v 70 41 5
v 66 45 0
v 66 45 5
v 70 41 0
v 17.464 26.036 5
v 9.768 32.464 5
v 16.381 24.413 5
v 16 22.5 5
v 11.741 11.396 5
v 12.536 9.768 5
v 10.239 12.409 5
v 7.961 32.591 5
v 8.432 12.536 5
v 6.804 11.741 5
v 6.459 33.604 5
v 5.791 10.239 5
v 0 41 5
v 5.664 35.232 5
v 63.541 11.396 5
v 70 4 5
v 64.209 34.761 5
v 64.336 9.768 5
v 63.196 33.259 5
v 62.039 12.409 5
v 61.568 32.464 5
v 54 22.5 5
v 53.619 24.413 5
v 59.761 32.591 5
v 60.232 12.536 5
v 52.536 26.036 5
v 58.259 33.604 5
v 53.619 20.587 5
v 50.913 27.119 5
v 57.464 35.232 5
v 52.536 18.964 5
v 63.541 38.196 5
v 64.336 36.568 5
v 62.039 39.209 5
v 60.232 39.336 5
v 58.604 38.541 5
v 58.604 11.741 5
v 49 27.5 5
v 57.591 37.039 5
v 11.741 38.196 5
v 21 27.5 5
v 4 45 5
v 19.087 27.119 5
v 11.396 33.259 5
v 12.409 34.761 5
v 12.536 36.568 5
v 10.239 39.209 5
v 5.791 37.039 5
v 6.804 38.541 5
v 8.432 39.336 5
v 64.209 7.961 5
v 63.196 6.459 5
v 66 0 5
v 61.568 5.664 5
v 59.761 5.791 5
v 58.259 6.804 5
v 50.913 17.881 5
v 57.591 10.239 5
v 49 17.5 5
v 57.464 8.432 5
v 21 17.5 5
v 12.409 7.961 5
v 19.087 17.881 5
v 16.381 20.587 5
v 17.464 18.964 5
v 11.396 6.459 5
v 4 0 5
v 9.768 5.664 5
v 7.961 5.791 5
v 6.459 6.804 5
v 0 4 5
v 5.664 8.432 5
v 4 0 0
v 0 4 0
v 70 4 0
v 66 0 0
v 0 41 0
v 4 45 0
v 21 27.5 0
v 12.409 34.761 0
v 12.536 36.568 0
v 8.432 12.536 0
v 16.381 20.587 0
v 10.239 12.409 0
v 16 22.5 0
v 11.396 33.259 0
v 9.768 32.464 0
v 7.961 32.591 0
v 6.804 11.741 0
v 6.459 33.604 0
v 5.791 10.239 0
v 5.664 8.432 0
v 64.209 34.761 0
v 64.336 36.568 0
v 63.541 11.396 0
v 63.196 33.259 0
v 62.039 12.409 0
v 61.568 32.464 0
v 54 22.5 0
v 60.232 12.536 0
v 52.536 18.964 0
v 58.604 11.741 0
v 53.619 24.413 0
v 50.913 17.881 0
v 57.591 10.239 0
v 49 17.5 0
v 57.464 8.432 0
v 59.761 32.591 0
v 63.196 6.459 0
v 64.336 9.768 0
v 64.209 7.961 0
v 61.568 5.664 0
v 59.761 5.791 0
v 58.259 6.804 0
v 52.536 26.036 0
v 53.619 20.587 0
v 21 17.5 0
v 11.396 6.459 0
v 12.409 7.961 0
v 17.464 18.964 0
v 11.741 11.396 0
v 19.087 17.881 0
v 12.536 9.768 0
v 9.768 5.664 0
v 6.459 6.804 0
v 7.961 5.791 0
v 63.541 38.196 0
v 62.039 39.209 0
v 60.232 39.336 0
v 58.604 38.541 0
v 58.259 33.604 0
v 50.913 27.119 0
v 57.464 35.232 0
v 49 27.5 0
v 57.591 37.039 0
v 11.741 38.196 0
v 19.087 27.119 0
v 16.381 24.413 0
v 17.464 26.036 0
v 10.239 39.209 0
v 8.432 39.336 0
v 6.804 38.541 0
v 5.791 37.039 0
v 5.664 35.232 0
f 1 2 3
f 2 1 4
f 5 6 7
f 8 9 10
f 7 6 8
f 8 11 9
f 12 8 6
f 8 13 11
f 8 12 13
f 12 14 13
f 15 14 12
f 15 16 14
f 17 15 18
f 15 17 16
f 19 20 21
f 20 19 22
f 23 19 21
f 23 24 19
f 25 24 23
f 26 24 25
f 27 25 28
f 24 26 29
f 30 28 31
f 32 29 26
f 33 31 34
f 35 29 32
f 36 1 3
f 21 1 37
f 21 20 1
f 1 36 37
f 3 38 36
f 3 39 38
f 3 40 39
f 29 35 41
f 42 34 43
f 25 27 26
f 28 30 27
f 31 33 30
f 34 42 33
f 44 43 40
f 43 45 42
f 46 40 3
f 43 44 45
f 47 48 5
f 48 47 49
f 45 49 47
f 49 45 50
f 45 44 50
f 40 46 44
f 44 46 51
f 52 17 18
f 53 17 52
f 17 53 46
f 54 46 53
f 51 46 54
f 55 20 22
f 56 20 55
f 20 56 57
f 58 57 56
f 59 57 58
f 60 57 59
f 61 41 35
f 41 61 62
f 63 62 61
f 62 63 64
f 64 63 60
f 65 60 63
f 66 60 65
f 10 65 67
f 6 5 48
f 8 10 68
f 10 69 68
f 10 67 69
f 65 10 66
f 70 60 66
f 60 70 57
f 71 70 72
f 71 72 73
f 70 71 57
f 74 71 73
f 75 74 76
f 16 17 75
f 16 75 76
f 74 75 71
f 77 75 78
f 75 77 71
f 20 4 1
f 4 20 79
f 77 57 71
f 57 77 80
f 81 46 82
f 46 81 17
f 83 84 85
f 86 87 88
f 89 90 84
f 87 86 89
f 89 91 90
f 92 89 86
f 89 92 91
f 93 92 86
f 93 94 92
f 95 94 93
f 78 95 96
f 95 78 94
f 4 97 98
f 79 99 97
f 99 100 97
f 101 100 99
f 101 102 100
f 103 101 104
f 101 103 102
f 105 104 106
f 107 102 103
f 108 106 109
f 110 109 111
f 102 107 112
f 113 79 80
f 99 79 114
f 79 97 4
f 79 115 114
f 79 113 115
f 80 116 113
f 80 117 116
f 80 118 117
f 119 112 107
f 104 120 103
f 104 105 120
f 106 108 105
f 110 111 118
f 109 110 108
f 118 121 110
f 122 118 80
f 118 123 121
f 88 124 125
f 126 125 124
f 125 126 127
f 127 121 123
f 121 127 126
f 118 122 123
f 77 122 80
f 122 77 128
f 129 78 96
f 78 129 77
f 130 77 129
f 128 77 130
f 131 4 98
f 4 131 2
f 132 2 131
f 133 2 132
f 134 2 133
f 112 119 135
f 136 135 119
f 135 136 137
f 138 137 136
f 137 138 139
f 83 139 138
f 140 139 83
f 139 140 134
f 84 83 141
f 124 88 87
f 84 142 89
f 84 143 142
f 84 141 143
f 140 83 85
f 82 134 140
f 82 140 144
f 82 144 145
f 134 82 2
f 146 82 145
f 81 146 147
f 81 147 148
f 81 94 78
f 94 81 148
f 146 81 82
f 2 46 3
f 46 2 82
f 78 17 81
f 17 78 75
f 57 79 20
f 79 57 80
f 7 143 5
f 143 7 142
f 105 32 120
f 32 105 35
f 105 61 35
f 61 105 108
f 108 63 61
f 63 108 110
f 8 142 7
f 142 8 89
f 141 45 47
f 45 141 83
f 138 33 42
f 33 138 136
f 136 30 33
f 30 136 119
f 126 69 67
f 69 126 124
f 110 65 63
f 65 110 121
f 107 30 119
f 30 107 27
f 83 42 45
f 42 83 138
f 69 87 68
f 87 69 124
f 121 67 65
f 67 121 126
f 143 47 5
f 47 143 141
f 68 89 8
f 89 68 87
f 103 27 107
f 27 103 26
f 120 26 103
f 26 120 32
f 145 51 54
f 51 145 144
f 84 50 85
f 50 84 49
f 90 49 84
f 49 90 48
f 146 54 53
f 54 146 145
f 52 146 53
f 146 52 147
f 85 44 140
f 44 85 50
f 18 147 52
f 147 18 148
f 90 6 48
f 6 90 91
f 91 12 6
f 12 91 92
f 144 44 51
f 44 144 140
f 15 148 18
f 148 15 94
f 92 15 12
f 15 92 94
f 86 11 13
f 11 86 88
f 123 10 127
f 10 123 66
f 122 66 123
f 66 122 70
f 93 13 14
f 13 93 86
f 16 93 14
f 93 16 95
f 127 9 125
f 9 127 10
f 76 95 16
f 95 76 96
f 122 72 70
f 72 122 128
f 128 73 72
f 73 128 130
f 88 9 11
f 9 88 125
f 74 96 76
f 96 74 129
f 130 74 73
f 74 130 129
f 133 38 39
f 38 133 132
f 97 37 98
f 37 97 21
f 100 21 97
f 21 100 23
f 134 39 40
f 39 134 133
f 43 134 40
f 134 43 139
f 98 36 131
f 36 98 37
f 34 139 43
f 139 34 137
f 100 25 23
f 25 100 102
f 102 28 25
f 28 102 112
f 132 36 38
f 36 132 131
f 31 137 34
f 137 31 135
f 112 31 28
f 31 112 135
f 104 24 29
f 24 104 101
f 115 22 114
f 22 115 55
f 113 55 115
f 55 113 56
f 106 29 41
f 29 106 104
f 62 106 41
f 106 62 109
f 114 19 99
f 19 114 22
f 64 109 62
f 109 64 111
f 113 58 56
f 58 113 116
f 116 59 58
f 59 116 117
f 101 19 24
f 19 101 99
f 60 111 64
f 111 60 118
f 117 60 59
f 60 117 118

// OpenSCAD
$fn = 32;

// ----------------------------------------------------------------------
// Bracket plate: slot plate 70 x 45
// ----------------------------------------------------------------------

// --- parameters (mm) ---
hole_r = 3.5;             // bolt hole radius
plate_t = 5;              // plate thickness, Z (extrusion height)
plate_l = 70;             // plate length
plate_w = 45;             // plate width
slot_l = 28;              // slot straight length
slot_r = 5;               // slot end radius

slot_len = slot_l + 2 * slot_r;
slot_w = 2 * slot_r;
hole_d2 = 2 * hole_r;

profile = [[4, 0], [66, 0], [70, 4], [70, 41], [66, 45], [4, 45], [0, 41], [0, 4]];  // primary outline, 8 points, counter clockwise
void_1 = [[49, 17.5], [50.913, 17.881], [52.536, 18.964], [53.619, 20.587], [54, 22.5], [53.619, 24.413], [52.536, 26.036], [50.913, 27.119], [49, 27.5], [21, 27.5], [19.087, 27.119], [17.464, 26.036], [16.381, 24.413], [16, 22.5], [16.381, 20.587], [17.464, 18.964], [19.087, 17.881], [21, 17.5]];  // grip slot, 18 points
void_2 = [[12.536, 36.568], [11.741, 38.196], [10.239, 39.209], [8.432, 39.336], [6.804, 38.541], [5.791, 37.039], [5.664, 35.232], [6.459, 33.604], [7.961, 32.591], [9.768, 32.464], [11.396, 33.259], [12.409, 34.761]];  // corner hole, 12 points
void_3 = [[12.536, 9.768], [11.741, 11.396], [10.239, 12.409], [8.432, 12.536], [6.804, 11.741], [5.791, 10.239], [5.664, 8.432], [6.459, 6.804], [7.961, 5.791], [9.768, 5.664], [11.396, 6.459], [12.409, 7.961]];  // corner hole, 12 points
void_4 = [[64.336, 36.568], [63.541, 38.196], [62.039, 39.209], [60.232, 39.336], [58.604, 38.541], [57.591, 37.039], [57.464, 35.232], [58.259, 33.604], [59.761, 32.591], [61.568, 32.464], [63.196, 33.259], [64.209, 34.761]];  // corner hole, 12 points
void_5 = [[64.336, 9.768], [63.541, 11.396], [62.039, 12.409], [60.232, 12.536], [58.604, 11.741], [57.591, 10.239], [57.464, 8.432], [58.259, 6.804], [59.761, 5.791], [61.568, 5.664], [63.196, 6.459], [64.209, 7.961]];  // corner hole, 12 points

// --- the one profile operation ---
difference() {
  linear_extrude(height = plate_t) polygon(points = profile);
  translate([0, 0, -1])
    linear_extrude(height = plate_t + 2) polygon(points = void_1);
  translate([0, 0, -1])
    linear_extrude(height = plate_t + 2) polygon(points = void_2);
  translate([0, 0, -1])
    linear_extrude(height = plate_t + 2) polygon(points = void_3);
  translate([0, 0, -1])
    linear_extrude(height = plate_t + 2) polygon(points = void_4);
  translate([0, 0, -1])
    linear_extrude(height = plate_t + 2) polygon(points = void_5);
}
